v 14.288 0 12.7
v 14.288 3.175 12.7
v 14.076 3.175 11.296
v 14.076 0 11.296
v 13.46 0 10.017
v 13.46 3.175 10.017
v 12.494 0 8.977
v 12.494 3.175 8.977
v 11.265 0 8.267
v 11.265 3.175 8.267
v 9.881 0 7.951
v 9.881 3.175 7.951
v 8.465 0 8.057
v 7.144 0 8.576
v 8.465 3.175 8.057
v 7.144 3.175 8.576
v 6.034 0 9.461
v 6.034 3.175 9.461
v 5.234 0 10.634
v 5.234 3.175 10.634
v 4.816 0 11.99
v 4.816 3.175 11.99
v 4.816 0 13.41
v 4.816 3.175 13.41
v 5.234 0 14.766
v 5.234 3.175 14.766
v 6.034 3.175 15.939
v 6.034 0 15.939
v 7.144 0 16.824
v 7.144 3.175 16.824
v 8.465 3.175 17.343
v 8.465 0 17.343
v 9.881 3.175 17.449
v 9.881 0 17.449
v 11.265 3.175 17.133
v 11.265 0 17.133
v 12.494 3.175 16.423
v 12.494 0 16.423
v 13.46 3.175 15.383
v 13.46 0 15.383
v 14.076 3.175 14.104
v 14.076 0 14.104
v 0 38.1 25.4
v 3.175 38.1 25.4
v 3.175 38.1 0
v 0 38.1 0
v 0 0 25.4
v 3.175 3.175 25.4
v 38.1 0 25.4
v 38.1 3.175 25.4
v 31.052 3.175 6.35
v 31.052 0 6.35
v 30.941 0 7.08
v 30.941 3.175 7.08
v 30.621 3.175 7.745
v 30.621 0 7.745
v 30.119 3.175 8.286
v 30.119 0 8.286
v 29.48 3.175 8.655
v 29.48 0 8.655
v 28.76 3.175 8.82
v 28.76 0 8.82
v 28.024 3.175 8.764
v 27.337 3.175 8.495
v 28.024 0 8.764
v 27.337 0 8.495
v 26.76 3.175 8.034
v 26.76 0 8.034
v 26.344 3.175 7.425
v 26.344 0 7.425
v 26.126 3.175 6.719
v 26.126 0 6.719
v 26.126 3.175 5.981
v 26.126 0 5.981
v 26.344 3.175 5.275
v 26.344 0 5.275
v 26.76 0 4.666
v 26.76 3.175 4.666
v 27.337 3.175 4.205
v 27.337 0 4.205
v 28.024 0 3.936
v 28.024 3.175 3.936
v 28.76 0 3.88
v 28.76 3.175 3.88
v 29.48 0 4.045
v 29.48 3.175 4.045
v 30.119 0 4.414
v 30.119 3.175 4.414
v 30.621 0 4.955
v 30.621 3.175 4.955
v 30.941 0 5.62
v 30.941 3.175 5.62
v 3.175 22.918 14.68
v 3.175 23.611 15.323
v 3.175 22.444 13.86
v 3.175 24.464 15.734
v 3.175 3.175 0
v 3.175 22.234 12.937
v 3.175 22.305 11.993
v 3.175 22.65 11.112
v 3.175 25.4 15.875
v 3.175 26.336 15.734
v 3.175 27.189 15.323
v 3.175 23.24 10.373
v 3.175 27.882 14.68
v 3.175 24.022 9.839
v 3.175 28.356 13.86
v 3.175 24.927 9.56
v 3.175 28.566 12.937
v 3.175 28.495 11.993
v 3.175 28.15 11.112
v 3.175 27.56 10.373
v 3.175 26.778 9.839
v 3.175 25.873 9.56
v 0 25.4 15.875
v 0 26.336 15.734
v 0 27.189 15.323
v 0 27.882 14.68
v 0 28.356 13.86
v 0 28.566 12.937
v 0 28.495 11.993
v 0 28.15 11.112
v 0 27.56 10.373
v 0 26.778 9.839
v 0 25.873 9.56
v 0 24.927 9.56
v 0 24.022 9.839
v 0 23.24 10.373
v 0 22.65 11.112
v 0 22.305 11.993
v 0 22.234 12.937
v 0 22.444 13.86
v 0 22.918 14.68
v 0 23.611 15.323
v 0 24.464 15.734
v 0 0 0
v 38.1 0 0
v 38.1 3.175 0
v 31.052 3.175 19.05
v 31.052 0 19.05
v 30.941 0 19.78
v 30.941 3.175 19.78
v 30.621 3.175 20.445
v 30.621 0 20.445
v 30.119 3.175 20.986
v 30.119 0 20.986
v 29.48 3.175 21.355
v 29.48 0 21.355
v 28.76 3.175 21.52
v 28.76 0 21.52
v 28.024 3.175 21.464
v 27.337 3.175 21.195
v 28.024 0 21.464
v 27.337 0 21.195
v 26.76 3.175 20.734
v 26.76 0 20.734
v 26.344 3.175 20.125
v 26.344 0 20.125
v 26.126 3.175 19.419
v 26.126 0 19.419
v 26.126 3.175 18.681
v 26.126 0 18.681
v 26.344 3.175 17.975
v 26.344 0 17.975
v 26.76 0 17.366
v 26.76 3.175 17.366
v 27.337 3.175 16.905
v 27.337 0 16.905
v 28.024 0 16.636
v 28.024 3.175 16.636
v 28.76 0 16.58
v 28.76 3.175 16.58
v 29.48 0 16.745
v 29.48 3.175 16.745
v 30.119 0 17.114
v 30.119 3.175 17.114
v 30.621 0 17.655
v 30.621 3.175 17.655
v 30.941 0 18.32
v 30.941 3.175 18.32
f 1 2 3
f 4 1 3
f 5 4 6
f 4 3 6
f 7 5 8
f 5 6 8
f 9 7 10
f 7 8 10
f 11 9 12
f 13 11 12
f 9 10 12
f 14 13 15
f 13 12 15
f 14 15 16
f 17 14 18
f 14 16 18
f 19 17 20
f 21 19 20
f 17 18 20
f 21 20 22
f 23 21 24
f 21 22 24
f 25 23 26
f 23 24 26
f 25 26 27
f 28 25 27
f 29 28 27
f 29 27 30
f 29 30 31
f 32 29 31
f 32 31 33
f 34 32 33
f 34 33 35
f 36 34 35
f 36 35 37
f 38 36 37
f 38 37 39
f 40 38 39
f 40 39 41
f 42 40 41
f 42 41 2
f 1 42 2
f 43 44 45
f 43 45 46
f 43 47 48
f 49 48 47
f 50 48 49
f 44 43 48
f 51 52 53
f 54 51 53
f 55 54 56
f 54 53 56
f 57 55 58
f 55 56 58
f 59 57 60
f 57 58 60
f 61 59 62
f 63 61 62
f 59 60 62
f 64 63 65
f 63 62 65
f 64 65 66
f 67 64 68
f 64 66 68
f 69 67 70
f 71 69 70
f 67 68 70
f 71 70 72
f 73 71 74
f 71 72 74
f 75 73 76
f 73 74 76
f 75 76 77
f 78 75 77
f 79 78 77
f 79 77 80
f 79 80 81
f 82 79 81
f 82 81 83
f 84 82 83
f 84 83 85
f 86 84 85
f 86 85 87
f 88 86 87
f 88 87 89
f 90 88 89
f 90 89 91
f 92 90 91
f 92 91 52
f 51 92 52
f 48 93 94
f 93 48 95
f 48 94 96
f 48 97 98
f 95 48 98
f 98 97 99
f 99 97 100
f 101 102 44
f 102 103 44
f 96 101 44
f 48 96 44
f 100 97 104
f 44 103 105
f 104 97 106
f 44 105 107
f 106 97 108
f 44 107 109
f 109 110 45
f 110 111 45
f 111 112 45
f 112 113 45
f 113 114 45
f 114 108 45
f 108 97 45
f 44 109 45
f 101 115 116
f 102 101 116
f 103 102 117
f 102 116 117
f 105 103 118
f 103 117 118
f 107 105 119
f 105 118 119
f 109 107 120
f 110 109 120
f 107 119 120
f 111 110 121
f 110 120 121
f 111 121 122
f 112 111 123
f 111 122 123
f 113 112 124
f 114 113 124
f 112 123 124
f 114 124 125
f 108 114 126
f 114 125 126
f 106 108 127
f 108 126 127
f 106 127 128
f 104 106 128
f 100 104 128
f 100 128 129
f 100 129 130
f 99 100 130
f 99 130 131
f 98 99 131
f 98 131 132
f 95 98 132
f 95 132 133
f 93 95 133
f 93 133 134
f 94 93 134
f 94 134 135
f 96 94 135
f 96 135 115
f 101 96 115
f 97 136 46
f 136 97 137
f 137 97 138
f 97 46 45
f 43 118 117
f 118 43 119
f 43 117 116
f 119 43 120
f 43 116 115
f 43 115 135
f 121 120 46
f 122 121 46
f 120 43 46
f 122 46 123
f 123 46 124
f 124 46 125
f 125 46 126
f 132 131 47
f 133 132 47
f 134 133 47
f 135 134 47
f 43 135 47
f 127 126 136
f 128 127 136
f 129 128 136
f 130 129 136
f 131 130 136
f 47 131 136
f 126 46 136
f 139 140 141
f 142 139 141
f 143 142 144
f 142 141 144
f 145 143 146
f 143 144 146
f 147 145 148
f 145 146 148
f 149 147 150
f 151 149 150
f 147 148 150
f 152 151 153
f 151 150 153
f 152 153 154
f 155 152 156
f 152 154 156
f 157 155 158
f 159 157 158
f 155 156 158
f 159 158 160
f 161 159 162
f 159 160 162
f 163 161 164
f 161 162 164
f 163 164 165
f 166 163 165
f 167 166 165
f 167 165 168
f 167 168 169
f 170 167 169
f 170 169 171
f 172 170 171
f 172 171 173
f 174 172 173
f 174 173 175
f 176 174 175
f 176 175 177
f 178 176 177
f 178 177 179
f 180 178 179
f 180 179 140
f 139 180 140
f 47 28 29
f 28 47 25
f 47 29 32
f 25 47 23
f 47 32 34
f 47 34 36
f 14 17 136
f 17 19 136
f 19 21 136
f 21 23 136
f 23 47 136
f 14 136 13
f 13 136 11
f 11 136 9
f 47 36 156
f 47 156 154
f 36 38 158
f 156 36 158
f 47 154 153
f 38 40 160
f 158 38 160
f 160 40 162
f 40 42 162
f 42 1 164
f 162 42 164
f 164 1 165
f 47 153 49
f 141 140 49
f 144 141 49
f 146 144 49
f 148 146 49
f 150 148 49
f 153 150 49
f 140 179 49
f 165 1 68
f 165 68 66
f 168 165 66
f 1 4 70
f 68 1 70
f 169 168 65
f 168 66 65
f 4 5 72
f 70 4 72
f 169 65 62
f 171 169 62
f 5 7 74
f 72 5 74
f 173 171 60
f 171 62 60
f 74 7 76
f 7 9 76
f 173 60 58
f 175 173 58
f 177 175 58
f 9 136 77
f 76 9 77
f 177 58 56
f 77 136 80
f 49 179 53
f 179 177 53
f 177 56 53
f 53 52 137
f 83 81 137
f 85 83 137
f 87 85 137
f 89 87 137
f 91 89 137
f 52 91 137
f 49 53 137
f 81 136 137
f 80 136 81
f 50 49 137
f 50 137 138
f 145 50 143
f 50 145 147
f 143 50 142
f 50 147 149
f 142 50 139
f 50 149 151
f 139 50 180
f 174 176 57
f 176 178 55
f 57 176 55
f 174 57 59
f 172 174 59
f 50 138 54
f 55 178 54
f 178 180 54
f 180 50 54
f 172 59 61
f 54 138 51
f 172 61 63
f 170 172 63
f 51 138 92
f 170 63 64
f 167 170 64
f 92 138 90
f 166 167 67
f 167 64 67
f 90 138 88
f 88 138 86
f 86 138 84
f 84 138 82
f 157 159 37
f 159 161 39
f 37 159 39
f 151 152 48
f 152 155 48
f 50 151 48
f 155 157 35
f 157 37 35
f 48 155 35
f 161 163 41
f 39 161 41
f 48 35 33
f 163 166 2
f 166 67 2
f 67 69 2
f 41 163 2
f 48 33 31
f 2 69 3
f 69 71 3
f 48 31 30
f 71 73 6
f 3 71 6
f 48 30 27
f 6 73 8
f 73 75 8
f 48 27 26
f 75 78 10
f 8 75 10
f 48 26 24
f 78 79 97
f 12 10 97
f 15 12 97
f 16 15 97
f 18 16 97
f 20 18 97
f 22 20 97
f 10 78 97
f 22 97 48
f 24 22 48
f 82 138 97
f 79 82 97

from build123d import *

# Parameters (mm, degrees)
EXTRUDE_THIN1_DEPTH = 25.4
SKETCH2_R           = 4.7625
CUT_EXTRUDE1_DEPTH  = 4.175
SKETCH3_R           = 2.4765
CUT_EXTRUDE2_DEPTH  = 39.1
SKETCH4_R           = 3.175
CUT_EXTRUDE3_DEPTH  = 39.1


with BuildPart() as part:
    # Sketch1 → Extrude-Thin1 (new body)
    with BuildSketch(Plane.XY):
        Polygon((0, 38.1), (0, 0), (38.1, 0), (38.1, 3.175), (3.175, 3.175), (3.175, 38.1), align=None)
    extrude(amount=EXTRUDE_THIN1_DEPTH)

    # Sketch2 → Cut-Extrude1 (cut, through all)
    with BuildSketch(Plane(origin=(0, 3.175, 0), x_dir=(1, 0, 0), z_dir=(0, 1, 0))):
        with Locations((9.525, -12.7)):
            Circle(SKETCH2_R)
    extrude(amount=-CUT_EXTRUDE1_DEPTH, mode=Mode.SUBTRACT)

    # Sketch3 → Cut-Extrude2 (cut, through all)
    with BuildSketch(Plane.XZ):
        with Locations((28.575, 19.05)):
            Circle(SKETCH3_R)
        with Locations((28.575, 6.35)):
            Circle(SKETCH3_R)
    extrude(amount=-CUT_EXTRUDE2_DEPTH, mode=Mode.SUBTRACT)

    # Sketch4 → Cut-Extrude3 (cut, through all)
    with BuildSketch(Plane.ZY):
        with Locations((12.7, 25.4)):
            Circle(SKETCH4_R)
    extrude(amount=-CUT_EXTRUDE3_DEPTH, mode=Mode.SUBTRACT)


solid = part.part
